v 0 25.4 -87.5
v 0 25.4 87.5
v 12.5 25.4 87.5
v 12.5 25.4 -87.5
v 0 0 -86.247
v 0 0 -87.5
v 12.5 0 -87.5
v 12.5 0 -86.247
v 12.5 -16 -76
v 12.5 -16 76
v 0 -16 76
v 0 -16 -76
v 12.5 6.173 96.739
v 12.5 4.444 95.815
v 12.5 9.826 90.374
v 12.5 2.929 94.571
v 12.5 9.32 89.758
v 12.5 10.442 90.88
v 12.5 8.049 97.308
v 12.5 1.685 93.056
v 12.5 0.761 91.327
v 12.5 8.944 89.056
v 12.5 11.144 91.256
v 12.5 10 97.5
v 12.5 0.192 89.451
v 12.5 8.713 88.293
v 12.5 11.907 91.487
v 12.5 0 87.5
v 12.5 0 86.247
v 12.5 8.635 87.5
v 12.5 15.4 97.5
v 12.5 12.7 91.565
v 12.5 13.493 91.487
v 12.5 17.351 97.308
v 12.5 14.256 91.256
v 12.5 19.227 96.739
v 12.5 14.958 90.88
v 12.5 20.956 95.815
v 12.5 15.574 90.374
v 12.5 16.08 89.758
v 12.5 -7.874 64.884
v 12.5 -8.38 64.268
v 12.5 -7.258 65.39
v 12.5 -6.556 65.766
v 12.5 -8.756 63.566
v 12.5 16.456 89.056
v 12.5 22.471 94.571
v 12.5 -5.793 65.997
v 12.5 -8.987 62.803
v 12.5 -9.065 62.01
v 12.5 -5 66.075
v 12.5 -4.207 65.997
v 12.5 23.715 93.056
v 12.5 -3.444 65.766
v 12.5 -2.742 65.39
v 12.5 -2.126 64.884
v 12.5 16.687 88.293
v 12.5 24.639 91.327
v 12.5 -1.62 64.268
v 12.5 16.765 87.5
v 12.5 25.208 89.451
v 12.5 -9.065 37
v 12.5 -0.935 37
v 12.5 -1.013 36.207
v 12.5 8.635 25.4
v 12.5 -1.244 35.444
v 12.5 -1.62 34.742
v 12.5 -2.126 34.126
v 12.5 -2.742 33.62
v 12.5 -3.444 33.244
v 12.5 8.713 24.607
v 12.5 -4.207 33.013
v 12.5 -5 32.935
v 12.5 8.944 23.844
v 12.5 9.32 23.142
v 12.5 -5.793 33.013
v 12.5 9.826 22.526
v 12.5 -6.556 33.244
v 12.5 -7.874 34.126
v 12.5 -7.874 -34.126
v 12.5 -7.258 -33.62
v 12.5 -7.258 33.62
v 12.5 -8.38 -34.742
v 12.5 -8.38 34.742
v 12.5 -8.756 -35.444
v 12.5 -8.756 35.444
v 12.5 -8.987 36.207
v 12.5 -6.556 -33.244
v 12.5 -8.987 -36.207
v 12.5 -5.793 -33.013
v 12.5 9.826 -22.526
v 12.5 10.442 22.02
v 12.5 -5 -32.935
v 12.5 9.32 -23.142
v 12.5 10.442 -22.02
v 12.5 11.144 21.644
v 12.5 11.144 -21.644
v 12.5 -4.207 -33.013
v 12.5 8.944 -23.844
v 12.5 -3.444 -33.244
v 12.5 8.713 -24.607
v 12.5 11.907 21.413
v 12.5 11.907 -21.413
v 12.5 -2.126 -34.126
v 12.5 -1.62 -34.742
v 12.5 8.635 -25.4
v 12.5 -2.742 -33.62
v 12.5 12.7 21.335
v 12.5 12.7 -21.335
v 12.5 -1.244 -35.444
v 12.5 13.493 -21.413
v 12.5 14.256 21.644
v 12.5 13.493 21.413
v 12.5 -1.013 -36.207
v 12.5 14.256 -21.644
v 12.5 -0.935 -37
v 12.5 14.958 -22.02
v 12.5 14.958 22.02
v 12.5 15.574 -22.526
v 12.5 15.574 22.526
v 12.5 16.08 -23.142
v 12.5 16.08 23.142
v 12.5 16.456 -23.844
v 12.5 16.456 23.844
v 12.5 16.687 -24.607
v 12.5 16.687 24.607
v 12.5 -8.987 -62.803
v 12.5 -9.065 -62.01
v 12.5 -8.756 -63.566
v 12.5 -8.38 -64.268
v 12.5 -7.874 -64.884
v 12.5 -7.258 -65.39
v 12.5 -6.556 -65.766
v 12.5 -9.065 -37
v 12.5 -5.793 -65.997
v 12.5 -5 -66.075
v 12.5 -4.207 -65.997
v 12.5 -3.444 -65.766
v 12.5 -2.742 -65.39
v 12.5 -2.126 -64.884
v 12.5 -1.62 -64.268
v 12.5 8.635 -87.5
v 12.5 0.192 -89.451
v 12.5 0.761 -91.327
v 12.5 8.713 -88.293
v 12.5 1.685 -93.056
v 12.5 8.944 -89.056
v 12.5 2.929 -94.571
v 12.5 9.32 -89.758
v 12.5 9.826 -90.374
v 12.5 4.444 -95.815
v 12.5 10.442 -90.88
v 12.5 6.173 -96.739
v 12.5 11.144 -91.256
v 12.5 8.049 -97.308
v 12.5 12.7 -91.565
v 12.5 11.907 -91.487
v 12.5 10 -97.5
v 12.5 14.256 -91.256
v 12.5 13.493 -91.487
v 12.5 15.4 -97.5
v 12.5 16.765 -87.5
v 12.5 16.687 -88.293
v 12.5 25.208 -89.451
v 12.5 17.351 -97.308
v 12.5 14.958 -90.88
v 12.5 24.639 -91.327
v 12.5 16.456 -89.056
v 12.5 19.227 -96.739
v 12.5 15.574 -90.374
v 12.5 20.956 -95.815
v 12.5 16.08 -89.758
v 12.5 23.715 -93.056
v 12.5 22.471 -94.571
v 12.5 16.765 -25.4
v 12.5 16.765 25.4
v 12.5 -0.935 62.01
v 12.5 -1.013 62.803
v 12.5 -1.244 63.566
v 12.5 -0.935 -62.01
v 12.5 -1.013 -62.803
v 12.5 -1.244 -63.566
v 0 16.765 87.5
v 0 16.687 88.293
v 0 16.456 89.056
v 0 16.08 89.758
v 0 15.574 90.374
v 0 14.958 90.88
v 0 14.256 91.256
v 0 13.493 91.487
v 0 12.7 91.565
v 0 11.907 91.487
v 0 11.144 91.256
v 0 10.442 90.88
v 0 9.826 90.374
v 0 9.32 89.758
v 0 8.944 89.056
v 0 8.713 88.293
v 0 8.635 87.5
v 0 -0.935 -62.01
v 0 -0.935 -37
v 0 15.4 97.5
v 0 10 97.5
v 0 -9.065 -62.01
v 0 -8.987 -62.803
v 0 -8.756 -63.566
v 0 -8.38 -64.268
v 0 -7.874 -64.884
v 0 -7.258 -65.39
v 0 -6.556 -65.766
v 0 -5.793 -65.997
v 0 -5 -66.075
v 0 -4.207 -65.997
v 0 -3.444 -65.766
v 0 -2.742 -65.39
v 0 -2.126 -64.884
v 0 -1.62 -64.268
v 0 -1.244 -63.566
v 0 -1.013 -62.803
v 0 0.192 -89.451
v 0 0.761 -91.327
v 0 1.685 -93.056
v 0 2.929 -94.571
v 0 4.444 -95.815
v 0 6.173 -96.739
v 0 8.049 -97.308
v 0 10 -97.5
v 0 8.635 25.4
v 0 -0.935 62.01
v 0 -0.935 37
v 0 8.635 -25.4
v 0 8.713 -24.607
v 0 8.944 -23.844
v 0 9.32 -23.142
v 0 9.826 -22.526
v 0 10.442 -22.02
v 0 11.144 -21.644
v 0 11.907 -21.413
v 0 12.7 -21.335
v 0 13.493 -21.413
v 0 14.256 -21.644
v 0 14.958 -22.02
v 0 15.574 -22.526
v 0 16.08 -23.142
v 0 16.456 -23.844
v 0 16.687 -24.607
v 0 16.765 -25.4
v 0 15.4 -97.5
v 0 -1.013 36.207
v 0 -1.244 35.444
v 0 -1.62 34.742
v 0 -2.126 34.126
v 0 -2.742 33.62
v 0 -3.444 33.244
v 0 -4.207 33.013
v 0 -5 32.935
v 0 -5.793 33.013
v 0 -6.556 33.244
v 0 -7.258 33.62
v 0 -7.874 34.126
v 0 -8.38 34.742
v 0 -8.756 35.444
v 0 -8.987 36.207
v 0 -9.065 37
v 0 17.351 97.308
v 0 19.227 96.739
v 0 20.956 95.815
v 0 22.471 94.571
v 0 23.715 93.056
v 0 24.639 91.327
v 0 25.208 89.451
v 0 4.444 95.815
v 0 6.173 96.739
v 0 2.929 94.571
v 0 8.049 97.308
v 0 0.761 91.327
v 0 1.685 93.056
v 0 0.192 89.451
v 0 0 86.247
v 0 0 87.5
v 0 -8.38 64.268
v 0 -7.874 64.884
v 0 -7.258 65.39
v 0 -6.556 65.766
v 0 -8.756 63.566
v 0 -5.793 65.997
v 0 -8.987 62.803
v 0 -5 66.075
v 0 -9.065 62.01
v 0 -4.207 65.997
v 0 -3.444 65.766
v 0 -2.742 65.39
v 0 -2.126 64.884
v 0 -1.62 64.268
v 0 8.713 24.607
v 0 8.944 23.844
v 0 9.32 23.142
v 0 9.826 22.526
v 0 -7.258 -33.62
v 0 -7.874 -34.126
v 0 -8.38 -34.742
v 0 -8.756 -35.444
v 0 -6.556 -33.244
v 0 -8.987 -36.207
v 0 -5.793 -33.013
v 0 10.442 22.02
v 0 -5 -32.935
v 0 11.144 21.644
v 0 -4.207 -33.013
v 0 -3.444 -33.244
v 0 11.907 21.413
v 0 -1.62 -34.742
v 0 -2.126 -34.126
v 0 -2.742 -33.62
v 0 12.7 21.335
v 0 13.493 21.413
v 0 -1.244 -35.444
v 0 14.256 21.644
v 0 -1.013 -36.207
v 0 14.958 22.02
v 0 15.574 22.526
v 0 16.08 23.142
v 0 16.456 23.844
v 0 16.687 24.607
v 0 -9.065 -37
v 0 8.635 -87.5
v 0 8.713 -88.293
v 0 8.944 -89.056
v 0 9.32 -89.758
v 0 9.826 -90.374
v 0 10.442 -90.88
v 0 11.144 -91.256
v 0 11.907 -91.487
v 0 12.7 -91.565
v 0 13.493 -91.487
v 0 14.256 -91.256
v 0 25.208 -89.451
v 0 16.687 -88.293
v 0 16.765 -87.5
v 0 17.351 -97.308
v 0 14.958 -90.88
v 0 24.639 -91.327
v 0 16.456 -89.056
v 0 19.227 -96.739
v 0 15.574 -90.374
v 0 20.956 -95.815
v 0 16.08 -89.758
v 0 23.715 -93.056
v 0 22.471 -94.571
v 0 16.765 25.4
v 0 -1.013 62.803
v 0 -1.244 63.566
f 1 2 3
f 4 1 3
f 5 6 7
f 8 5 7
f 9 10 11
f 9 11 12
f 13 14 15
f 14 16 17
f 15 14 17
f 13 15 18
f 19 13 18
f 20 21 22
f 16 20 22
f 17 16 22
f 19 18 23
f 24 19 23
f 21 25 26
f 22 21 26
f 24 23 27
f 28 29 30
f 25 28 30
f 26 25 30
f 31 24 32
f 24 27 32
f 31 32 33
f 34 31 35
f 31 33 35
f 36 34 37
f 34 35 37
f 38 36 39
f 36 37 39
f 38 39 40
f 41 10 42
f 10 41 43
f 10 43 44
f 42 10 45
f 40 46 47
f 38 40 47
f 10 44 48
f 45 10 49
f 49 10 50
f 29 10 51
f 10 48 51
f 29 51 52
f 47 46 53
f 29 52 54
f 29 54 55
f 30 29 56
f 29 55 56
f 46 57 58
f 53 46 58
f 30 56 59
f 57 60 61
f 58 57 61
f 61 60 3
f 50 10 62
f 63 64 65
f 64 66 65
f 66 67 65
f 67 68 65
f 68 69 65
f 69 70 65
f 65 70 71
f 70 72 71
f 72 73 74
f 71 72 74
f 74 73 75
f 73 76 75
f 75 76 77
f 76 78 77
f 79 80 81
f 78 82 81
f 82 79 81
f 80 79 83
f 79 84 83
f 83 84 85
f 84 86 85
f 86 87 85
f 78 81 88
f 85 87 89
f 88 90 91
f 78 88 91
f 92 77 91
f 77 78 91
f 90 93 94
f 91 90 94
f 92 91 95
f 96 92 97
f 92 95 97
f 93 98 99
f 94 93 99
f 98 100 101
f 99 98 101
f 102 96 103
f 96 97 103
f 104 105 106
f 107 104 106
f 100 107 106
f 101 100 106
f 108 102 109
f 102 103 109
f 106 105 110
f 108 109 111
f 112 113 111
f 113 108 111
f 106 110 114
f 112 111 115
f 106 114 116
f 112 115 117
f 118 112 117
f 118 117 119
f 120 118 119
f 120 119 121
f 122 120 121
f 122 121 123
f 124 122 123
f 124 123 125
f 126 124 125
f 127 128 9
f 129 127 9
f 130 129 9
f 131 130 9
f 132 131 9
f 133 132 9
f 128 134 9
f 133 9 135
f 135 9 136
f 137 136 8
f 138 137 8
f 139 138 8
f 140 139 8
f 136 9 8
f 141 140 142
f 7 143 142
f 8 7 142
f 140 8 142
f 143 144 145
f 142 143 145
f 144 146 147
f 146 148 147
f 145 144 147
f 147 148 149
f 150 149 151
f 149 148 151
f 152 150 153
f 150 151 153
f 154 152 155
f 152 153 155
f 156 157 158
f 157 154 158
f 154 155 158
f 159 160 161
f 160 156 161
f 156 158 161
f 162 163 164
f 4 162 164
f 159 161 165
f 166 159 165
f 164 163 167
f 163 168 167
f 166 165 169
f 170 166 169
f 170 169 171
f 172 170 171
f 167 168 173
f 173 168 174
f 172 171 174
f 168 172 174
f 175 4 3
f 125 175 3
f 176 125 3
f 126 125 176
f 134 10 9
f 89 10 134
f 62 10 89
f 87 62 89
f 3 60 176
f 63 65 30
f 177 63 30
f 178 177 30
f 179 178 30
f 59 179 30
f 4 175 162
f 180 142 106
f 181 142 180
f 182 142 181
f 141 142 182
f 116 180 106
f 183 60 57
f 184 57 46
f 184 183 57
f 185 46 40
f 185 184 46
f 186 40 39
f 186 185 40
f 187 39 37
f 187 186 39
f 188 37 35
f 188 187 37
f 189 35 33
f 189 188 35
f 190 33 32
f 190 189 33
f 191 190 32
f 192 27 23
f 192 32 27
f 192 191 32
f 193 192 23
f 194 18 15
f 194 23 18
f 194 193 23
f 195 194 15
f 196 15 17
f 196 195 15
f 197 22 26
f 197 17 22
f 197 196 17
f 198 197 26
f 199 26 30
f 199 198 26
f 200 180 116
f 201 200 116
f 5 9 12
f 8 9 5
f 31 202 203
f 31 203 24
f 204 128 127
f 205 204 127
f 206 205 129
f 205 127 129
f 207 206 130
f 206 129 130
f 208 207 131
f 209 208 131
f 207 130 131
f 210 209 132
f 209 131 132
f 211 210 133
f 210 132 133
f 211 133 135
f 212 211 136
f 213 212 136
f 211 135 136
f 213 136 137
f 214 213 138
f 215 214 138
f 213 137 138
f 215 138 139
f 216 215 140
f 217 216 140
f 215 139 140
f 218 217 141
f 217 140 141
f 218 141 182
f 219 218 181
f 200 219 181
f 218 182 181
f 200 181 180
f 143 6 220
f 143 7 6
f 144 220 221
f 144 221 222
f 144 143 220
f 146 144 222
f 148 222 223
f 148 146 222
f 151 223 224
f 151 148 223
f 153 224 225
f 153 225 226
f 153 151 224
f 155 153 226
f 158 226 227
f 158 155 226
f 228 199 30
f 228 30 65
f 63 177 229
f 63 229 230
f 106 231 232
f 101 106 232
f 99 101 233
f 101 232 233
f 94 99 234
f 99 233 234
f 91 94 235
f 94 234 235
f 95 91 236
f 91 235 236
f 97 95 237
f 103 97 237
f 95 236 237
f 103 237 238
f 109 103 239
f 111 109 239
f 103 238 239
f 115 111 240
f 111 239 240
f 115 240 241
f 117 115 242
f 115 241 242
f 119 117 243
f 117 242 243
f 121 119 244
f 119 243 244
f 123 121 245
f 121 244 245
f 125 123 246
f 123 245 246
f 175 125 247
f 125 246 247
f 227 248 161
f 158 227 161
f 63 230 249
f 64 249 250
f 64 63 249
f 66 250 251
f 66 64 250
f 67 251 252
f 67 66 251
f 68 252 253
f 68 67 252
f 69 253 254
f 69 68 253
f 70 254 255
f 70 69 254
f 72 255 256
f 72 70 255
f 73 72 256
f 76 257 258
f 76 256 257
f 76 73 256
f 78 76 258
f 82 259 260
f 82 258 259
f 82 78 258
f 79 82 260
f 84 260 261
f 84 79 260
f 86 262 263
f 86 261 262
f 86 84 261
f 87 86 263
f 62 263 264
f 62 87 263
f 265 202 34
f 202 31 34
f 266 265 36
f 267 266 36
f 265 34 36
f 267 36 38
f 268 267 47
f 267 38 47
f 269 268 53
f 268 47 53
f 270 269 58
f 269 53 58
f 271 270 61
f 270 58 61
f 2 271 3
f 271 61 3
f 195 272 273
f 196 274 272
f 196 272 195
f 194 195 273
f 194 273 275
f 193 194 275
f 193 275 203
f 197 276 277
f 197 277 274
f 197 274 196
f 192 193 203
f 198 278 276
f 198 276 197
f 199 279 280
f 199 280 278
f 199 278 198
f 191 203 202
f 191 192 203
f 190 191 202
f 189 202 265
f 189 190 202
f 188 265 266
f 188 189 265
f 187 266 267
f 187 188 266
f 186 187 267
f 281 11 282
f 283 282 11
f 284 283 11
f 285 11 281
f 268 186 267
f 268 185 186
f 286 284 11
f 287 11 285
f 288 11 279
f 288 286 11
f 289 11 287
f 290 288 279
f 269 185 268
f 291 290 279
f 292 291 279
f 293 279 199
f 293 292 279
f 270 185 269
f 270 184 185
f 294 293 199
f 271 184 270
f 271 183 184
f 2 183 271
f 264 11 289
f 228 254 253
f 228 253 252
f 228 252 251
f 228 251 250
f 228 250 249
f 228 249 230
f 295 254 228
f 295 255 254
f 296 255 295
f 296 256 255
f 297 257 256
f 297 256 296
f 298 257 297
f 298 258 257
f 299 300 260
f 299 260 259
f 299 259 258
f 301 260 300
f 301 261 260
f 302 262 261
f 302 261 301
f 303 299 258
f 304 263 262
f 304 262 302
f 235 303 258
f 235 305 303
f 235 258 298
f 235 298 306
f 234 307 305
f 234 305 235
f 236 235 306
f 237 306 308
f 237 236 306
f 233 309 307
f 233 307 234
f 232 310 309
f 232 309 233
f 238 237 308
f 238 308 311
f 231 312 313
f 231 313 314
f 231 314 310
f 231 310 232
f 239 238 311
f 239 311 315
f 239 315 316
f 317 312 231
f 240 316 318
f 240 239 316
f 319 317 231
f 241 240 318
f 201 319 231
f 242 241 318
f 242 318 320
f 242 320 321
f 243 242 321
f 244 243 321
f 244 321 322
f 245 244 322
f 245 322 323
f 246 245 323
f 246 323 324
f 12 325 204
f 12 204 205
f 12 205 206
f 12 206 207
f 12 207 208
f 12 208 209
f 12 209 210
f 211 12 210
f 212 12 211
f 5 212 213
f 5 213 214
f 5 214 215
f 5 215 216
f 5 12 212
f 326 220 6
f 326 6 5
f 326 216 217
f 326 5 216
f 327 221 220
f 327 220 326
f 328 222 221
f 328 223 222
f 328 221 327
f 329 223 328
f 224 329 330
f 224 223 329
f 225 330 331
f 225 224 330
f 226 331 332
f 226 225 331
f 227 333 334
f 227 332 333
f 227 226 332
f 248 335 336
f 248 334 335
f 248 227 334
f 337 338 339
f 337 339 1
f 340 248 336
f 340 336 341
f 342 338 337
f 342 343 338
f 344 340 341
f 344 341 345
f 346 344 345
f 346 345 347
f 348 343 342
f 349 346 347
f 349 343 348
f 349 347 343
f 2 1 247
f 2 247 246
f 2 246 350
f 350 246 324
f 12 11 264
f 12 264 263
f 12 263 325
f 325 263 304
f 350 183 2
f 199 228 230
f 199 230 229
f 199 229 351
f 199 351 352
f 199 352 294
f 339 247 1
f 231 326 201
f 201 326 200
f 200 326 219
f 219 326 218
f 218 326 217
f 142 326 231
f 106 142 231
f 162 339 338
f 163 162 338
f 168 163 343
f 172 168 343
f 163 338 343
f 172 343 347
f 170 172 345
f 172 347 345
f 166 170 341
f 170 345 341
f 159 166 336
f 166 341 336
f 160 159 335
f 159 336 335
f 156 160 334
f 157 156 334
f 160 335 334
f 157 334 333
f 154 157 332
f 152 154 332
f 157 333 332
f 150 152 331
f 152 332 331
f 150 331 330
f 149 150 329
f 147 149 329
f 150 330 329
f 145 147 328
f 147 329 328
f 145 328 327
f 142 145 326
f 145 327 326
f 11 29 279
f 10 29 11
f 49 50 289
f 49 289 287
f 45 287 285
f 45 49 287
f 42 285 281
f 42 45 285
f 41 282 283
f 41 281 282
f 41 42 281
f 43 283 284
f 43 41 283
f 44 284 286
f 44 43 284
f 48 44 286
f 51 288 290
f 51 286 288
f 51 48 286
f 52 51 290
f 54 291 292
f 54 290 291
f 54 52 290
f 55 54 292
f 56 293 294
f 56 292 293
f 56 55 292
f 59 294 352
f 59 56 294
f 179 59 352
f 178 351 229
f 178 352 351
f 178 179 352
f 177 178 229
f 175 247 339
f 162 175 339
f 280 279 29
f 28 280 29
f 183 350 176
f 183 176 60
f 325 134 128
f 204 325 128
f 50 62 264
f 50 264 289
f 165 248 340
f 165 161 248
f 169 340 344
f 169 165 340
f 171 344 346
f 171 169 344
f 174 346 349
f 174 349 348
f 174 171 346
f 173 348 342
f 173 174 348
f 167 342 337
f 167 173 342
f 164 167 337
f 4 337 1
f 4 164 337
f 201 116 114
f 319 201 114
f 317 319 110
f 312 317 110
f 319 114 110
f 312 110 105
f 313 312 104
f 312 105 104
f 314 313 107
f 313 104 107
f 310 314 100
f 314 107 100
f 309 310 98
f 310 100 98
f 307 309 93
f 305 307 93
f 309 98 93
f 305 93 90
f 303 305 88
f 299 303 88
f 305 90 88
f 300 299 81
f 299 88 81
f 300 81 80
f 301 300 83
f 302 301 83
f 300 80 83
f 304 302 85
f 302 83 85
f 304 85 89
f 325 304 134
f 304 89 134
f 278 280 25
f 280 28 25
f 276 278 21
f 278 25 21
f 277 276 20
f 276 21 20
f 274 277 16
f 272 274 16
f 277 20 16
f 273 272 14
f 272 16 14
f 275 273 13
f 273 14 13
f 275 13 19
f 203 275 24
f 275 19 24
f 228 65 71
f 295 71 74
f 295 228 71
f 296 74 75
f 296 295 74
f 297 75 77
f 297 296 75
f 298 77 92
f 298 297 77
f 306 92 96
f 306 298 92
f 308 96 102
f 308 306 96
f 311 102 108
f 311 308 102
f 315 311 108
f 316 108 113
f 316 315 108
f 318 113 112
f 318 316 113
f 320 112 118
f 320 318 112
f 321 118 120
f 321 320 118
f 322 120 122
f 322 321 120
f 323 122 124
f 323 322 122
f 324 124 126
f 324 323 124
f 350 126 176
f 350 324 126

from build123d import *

# Parameters (mm, degrees)
BOSS_EXTRU_1_DEPTH      = 97.5
BOSS_EXTRU_1_DEPTH_BACK = 97.5
ESQUISSE1_W             = 12.5
ESQUISSE1_H             = 25.4
ENL_V_MAT_EXTRU_1_DEPTH = 102.526646749
CONG_1_R                = 10
CONG_2_R                = 10
CONG_3_R                = 10
CONG_4_R                = 10
BOSS_EXTRU_4_DEPTH      = 12.5
ENL_V_MAT_EXTRU_2_DEPTH = 102.526646749


with BuildPart() as part:
    # Esquisse1 → Boss.-Extru.1 (new, two sides: drawn at the far end of the back side and taken through both)
    with BuildSketch(Plane.XY.offset(-BOSS_EXTRU_1_DEPTH_BACK)):
        with Locations((6.25, 12.7)):
            Rectangle(ESQUISSE1_W, ESQUISSE1_H)
    extrude(amount=BOSS_EXTRU_1_DEPTH + BOSS_EXTRU_1_DEPTH_BACK)

    # Esquisse3 → Enlèv. mat.-Extru.1 (cut, through all)
    with BuildSketch(Plane.ZY):
        with BuildLine():
            Line((25.4, 16.765), (87.5, 16.765))
            ThreePointArc((87.5, 16.765), (91.565, 12.7), (87.5, 8.635))
            Line((87.5, 8.635), (25.4, 8.635))
            ThreePointArc((25.4, 8.635), (21.335, 12.7), (25.4, 16.765))
        make_face()
    enl_v_mat_extru_1 = extrude(amount=-ENL_V_MAT_EXTRU_1_DEPTH, mode=Mode.SUBTRACT)

    # Symétrie1: Enlèv. mat.-Extru.1 across plane
    add(enl_v_mat_extru_1.mirror(Plane.XY), mode=Mode.SUBTRACT)

    # Congé1
    cong_1_edges = [part.edges().sort_by_distance(p)[0] for p in [
        (6.25, 0, -97.5),
    ]]
    fillet(cong_1_edges, radius=CONG_1_R)

    # Congé2
    cong_2_edges = [part.edges().sort_by_distance(p)[0] for p in [
        (6.25, 25.4, -97.5),
    ]]
    fillet(cong_2_edges, radius=CONG_2_R)

    # Congé3
    cong_3_edges = [part.edges().sort_by_distance(p)[0] for p in [
        (6.25, 0, 97.5),
    ]]
    fillet(cong_3_edges, radius=CONG_3_R)

    # Congé4
    cong_4_edges = [part.edges().sort_by_distance(p)[0] for p in [
        (6.25, 25.4, 97.5),
    ]]
    fillet(cong_4_edges, radius=CONG_4_R)

    # Esquisse4 → Boss.-Extru.4 (add)
    with BuildSketch(Plane(origin=(12.5, 0, 0), x_dir=(0, 0, -1), z_dir=(1, 0, 0))):
        Polygon((0, 0), (-56.566309771, 0), (-86.246950766, 0), (-76, -16), (0, -16), (76, -16), (86.246950766, 0), (56.566309771, 0), align=None)
    extrude(amount=-BOSS_EXTRU_4_DEPTH)

    # Esquisse5 → Enlèv. mat.-Extru.2 (cut, through all)
    with BuildSketch(Plane(origin=(12.5, 0, 0), x_dir=(0, 0, -1), z_dir=(1, 0, 0))):
        with BuildLine():
            Line((-62.01, -0.935), (-37, -0.935))
            ThreePointArc((-37, -0.935), (-32.935, -5), (-37, -9.065))
            Line((-37, -9.065), (-62.01, -9.065))
            ThreePointArc((-62.01, -9.065), (-66.075, -5), (-62.01, -0.935))
        make_face()
    enl_v_mat_extru_2 = extrude(amount=-ENL_V_MAT_EXTRU_2_DEPTH, mode=Mode.SUBTRACT)

    # Symétrie2: Enlèv. mat.-Extru.2 across plane
    add(enl_v_mat_extru_2.mirror(Plane.XY), mode=Mode.SUBTRACT)


solid = part.part
